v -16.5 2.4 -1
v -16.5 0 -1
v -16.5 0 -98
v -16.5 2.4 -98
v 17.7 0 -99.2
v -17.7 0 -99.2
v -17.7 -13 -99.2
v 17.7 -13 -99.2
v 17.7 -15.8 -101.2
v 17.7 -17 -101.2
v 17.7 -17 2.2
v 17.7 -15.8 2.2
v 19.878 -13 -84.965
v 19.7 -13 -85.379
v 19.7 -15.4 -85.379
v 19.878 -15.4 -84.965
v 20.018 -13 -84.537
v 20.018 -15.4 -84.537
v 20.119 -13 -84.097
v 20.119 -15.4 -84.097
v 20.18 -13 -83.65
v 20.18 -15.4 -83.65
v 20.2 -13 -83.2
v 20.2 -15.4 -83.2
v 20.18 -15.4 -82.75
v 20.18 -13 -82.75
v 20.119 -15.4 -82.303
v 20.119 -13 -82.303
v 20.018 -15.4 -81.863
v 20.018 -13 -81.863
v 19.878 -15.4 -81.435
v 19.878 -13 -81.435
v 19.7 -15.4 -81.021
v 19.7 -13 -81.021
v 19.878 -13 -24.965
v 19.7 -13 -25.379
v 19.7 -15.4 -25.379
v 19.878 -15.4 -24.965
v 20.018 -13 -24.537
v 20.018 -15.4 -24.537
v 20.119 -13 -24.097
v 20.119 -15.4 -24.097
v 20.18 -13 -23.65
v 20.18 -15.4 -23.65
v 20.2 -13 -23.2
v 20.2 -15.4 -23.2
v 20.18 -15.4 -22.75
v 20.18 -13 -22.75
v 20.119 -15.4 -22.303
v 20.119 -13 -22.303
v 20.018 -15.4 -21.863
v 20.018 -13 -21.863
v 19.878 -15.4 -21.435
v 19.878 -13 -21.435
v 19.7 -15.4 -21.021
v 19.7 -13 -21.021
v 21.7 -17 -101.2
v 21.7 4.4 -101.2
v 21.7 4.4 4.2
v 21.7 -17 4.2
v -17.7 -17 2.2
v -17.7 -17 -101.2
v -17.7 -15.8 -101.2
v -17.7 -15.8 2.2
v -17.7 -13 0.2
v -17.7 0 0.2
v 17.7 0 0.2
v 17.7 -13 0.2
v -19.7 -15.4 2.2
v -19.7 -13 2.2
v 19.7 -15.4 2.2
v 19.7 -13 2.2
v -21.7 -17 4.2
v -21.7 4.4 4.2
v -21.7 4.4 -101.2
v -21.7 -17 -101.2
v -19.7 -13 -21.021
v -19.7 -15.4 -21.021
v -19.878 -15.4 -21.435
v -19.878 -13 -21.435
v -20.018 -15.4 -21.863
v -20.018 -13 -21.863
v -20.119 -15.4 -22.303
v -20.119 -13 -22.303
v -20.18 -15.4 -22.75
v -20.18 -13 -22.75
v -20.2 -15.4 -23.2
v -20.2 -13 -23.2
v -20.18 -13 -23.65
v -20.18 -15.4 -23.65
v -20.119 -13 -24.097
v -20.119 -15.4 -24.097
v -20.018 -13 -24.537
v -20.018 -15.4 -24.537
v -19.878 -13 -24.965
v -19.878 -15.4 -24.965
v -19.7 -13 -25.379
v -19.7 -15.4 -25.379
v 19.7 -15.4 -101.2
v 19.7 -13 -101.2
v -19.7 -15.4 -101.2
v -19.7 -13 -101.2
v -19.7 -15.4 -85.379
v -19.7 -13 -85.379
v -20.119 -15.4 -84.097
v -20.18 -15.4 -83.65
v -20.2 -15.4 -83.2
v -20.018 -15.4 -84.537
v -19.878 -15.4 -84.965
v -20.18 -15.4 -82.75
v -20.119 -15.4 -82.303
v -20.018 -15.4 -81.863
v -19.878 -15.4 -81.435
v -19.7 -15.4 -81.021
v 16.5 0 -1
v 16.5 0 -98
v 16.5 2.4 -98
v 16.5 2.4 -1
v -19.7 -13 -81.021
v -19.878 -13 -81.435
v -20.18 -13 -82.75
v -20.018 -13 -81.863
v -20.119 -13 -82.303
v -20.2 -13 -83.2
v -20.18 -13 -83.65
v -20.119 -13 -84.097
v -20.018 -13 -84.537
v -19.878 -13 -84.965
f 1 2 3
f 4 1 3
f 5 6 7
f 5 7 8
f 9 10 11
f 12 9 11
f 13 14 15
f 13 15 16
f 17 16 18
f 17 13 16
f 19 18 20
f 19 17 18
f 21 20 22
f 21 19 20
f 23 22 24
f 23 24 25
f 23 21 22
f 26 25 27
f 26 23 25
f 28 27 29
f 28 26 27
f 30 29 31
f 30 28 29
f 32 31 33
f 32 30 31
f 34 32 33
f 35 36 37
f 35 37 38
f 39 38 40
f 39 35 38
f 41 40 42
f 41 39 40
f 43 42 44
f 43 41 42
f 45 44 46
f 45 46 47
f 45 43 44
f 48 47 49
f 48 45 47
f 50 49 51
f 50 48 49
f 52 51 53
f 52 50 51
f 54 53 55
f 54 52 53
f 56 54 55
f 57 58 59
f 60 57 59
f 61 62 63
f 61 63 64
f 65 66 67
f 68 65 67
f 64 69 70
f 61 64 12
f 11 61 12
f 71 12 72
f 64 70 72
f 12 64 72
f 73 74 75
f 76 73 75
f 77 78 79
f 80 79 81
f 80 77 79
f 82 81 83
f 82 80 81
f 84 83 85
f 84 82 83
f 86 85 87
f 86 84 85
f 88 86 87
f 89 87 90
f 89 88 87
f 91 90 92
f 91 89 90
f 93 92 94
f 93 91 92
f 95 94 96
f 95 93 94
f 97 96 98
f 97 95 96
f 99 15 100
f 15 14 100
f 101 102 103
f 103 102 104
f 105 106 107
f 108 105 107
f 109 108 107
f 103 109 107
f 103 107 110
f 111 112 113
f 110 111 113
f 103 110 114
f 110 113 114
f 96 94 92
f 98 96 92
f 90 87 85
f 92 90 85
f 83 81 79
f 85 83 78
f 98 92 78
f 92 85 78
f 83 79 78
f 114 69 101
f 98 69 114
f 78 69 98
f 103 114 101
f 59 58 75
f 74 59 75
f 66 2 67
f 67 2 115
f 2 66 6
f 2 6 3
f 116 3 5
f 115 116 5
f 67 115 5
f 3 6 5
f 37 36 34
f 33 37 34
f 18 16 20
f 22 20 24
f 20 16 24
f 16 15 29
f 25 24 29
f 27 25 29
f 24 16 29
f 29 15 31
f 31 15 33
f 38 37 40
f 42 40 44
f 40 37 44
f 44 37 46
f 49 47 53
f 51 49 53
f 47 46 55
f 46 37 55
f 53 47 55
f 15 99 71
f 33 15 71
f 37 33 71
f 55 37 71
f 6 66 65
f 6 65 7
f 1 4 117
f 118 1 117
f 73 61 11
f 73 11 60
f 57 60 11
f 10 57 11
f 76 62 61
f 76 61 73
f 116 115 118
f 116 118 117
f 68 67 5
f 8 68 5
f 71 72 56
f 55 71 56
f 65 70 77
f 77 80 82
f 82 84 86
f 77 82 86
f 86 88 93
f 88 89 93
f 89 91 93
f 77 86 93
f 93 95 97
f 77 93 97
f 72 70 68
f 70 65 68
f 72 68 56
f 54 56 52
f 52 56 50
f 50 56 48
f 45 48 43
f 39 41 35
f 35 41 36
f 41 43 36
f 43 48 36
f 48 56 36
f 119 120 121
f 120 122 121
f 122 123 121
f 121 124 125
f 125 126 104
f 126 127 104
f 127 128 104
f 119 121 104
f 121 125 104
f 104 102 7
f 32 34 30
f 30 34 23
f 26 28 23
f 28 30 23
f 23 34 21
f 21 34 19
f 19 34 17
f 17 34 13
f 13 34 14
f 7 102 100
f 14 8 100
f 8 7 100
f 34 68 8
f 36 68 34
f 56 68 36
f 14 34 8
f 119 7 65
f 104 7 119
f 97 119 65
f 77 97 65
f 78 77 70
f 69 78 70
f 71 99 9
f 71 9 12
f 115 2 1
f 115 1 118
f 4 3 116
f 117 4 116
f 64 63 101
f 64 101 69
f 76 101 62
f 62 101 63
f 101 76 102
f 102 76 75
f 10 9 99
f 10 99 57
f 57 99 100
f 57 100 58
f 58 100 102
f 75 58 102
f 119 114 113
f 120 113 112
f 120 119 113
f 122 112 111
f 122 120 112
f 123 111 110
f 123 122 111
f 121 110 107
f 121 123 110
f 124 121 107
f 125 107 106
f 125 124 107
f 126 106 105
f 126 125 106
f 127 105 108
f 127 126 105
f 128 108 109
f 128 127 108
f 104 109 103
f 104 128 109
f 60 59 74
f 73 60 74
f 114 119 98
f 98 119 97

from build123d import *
from OCP.BRepFilletAPI import BRepFilletAPI_MakeChamfer

# Parameters (mm, degrees)
SKETCH1_W           = 35.4
SKETCH1_H           = 99.4
SKETCH1_W_2         = 33
SKETCH1_H_2         = 97
BOSS_EXTRUDE1_DEPTH = 2.4
SKETCH2_W           = 39.4
SKETCH2_H           = 103.4
SKETCH2_W_2         = 35.4
SKETCH2_H_2         = 99.4
BOSS_EXTRUDE3_DEPTH = 15.4
SKETCH3_W           = 39.4
SKETCH3_H           = 103.4
BOSS_EXTRUDE4_DEPTH = 2
BOSS_EXTRUDE5_DEPTH = 21.4
SKETCH5_R           = 5
CUT_EXTRUDE1_DEPTH  = 2.4
SKETCH6_W           = 4
SKETCH6_H           = 105.4
BOSS_EXTRUDE6_DEPTH = 1.6
CHAMFER1_SIZE       = 0.4
CHAMFER1_SIZE_2     = 2


with BuildPart() as part:
    # Sketch1 → Boss-Extrude1 (new body)
    with BuildSketch(Plane(origin=(0, 0, 0), x_dir=(1, 0, 0), z_dir=(0, 1, 0))):
        with Locations((0, 49.5)):
            Rectangle(SKETCH1_W, SKETCH1_H)
        with Locations((0, 49.5)):
            Rectangle(SKETCH1_W_2, SKETCH1_H_2, mode=Mode.SUBTRACT)
    extrude(amount=BOSS_EXTRUDE1_DEPTH)

    # Sketch2 → Boss-Extrude3 (add)
    with BuildSketch(Plane(origin=(0, 2.4, 0), x_dir=(1, 0, 0), z_dir=(0, 1, 0))):
        with Locations((0, 49.5)):
            Rectangle(SKETCH2_W, SKETCH2_H)
        with Locations((0, 49.5)):
            Rectangle(SKETCH2_W_2, SKETCH2_H_2, mode=Mode.SUBTRACT)
    extrude(amount=-BOSS_EXTRUDE3_DEPTH)

    # Sketch3 → Boss-Extrude4 (add)
    with BuildSketch(Plane(origin=(0, 2.4, 0), x_dir=(1, 0, 0), z_dir=(0, 1, 0))):
        with Locations((0, 49.5)):
            Rectangle(SKETCH3_W, SKETCH3_H)
    extrude(amount=BOSS_EXTRUDE4_DEPTH)

    # Sketch4 → Boss-Extrude5 (add)
    with BuildSketch(Plane(origin=(0, 4.4, 0), x_dir=(1, 0, 0), z_dir=(0, 1, 0))):
        Polygon((21.7, 101.2), (21.7, -4.2), (-21.7, -4.2), (-21.7, 101.2), (-19.7, 101.2), (-19.7, -2.2), (19.7, -2.2), (19.7, 101.2), align=None)
    extrude(amount=-BOSS_EXTRUDE5_DEPTH)

    # Sketch5 → Cut-Extrude1 (cut)
    with BuildSketch(Plane.XZ.offset(13)):
        with Locations((-15.2, -23.2)):
            Circle(SKETCH5_R)
        with Locations((15.2, -23.2)):
            Circle(SKETCH5_R)
        with Locations((15.2, -83.2)):
            Circle(SKETCH5_R)
        with Locations((-15.2, -83.2)):
            Circle(SKETCH5_R)
    extrude(amount=CUT_EXTRUDE1_DEPTH, mode=Mode.SUBTRACT)

    # Sketch6 → Boss-Extrude6 (add)
    with BuildSketch(Plane.XZ.offset(17)):
        with Locations((-19.7, -48.5)):
            Rectangle(SKETCH6_W, SKETCH6_H)
        with Locations((19.7, -48.5)):
            Rectangle(SKETCH6_W, SKETCH6_H)
    extrude(amount=-BOSS_EXTRUDE6_DEPTH)

    # Chamfer1
    chamfer1_edges_1 = [part.edges().sort_by_distance(p)[0] for p in [
        (17.7, -15.4, -49.5),
    ]]
    chamfer1_side_1 = [part.faces().sort_by_distance(p)[0] for p in [
        (17.7, -15.408, -49.5),
    ]]
    chamfer1_edges_2 = [part.edges().sort_by_distance(p)[0] for p in [
        (-17.7, -15.4, -49.5),
    ]]
    chamfer1_side_2 = [part.faces().sort_by_distance(p)[0] for p in [
        (-17.708, -15.4, -49.5),
    ]]
    chamfer1 = BRepFilletAPI_MakeChamfer(part.part.solid().wrapped)
    for e in chamfer1_edges_1:
        chamfer1.Add(CHAMFER1_SIZE - 0.0001, CHAMFER1_SIZE_2 - 0.0001, e.wrapped, chamfer1_side_1[0].wrapped)
    for e in chamfer1_edges_2:
        chamfer1.Add(CHAMFER1_SIZE_2 - 0.0001, CHAMFER1_SIZE - 0.0001, e.wrapped, chamfer1_side_2[0].wrapped)
    add(Compound.cast(chamfer1.Shape()), mode=Mode.REPLACE)  # a hair under: the kernel refuses the full size


solid = part.part
